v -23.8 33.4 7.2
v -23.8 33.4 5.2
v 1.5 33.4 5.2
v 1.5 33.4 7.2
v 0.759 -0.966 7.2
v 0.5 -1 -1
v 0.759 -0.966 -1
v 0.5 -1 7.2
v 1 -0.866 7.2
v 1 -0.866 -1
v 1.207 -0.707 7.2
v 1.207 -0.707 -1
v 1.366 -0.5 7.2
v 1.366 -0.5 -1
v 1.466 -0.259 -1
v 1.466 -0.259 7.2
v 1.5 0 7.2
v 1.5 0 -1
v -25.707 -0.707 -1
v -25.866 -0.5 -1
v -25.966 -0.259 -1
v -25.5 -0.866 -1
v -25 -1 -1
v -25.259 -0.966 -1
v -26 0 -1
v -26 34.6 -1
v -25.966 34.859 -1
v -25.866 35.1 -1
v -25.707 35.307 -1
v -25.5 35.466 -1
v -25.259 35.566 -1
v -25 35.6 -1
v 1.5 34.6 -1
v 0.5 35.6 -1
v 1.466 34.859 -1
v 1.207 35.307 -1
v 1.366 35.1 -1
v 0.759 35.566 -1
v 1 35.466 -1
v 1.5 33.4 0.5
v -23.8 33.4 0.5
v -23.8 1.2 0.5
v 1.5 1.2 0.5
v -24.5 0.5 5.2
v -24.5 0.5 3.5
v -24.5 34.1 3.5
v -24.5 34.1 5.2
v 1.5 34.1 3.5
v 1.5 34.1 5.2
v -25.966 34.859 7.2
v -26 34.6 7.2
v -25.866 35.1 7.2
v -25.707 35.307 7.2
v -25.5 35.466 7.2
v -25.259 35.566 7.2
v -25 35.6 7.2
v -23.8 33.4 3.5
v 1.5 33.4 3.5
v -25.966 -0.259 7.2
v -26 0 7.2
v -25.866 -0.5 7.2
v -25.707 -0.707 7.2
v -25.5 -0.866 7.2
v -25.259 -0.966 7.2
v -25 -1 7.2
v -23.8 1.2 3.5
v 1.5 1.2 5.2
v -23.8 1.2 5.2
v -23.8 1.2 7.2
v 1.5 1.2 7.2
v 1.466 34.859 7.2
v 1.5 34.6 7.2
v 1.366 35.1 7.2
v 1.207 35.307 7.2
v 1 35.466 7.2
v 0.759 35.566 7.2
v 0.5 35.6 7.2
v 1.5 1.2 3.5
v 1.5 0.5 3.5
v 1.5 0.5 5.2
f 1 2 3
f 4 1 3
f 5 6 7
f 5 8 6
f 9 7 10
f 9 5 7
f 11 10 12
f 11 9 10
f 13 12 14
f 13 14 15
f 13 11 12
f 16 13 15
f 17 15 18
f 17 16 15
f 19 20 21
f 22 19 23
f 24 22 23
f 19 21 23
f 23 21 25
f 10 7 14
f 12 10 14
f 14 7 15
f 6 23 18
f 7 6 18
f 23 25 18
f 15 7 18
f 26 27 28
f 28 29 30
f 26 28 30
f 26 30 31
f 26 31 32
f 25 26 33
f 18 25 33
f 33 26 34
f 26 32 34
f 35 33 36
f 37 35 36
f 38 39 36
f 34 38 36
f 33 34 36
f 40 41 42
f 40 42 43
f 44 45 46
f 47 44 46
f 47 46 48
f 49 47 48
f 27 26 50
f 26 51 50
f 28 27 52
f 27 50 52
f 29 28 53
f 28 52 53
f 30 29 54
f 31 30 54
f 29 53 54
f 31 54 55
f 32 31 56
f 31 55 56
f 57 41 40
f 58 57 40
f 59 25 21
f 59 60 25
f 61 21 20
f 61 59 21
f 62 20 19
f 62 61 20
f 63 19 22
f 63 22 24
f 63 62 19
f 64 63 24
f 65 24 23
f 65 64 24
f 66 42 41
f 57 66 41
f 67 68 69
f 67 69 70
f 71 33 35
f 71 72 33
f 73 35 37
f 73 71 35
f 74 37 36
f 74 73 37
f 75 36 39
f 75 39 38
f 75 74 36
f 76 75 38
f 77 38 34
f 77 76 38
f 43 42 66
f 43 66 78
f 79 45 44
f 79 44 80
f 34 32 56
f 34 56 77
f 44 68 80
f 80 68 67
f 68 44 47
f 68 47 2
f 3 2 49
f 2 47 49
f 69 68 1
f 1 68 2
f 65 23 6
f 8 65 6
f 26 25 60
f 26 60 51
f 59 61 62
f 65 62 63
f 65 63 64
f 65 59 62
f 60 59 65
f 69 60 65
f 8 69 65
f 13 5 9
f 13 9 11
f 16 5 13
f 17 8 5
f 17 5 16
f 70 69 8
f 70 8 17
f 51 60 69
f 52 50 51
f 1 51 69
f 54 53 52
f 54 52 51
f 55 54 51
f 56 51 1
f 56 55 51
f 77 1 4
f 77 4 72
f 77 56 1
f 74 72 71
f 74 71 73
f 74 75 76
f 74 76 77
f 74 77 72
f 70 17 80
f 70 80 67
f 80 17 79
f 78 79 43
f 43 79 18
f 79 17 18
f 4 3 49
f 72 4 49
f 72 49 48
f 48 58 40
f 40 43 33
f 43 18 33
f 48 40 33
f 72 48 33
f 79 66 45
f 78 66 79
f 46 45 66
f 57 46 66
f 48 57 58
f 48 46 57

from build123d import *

# Parameters (mm, degrees)
BOX027_W     = 26
BOX027_H     = 33.6
BOX027_DEPTH = 1.7
BOX026_W     = 26.1
BOX026_H     = 32.2
BOX026_DEPTH = 6.7
BOX025_W     = 27.5
BOX025_H     = 36.6
BOX025_DEPTH = 8.2
FILLET001_R  = 1


with BuildPart() as pcb_extract_cube001:
    # Box027 → Box027 (new body)
    with BuildSketch(Plane(origin=(1.5, 1.5, 4.5), x_dir=(1, 0, 0), z_dir=(0, 0, 1))):
        with Locations((13, 16.8)):
            Rectangle(BOX027_W, BOX027_H)
    extrude(amount=BOX027_DEPTH)


with BuildPart() as extract_fusion001:
    # Box026 → Box026 (new body)
    with BuildSketch(Plane(origin=(2.2, 2.2, 1.5), x_dir=(1, 0, 0), z_dir=(0, 0, 1))):
        with Locations((13.05, 16.1)):
            Rectangle(BOX026_W, BOX026_H)
    extrude(amount=BOX026_DEPTH)

    # Fusion003: union pcb extract cube001
    add(pcb_extract_cube001.part)


with BuildPart() as lion_manager_cut:
    # Box025 → Box025 (new body)
    with BuildSketch(Plane.XY):
        with Locations((13.75, 18.3)):
            Rectangle(BOX025_W, BOX025_H)
    extrude(amount=BOX025_DEPTH)

    # Fillet001
    fillet001_edges = [lion_manager_cut.edges().sort_by_distance(p)[0] for p in [
        (0, 0, 4.1),
        (0, 36.6, 4.1),
        (27.5, 0, 4.1),
        (27.5, 36.6, 4.1),
    ]]
    fillet(fillet001_edges, radius=FILLET001_R)

    # Cut002: cut extract fusion001
    add(extract_fusion001.part, mode=Mode.SUBTRACT)


with BuildPart() as lion_manager_cut_1:
    # Cut002 placement: moved
    add(lion_manager_cut.part.moved(Location((-26, -1, -1))))


solid = lion_manager_cut_1.part
